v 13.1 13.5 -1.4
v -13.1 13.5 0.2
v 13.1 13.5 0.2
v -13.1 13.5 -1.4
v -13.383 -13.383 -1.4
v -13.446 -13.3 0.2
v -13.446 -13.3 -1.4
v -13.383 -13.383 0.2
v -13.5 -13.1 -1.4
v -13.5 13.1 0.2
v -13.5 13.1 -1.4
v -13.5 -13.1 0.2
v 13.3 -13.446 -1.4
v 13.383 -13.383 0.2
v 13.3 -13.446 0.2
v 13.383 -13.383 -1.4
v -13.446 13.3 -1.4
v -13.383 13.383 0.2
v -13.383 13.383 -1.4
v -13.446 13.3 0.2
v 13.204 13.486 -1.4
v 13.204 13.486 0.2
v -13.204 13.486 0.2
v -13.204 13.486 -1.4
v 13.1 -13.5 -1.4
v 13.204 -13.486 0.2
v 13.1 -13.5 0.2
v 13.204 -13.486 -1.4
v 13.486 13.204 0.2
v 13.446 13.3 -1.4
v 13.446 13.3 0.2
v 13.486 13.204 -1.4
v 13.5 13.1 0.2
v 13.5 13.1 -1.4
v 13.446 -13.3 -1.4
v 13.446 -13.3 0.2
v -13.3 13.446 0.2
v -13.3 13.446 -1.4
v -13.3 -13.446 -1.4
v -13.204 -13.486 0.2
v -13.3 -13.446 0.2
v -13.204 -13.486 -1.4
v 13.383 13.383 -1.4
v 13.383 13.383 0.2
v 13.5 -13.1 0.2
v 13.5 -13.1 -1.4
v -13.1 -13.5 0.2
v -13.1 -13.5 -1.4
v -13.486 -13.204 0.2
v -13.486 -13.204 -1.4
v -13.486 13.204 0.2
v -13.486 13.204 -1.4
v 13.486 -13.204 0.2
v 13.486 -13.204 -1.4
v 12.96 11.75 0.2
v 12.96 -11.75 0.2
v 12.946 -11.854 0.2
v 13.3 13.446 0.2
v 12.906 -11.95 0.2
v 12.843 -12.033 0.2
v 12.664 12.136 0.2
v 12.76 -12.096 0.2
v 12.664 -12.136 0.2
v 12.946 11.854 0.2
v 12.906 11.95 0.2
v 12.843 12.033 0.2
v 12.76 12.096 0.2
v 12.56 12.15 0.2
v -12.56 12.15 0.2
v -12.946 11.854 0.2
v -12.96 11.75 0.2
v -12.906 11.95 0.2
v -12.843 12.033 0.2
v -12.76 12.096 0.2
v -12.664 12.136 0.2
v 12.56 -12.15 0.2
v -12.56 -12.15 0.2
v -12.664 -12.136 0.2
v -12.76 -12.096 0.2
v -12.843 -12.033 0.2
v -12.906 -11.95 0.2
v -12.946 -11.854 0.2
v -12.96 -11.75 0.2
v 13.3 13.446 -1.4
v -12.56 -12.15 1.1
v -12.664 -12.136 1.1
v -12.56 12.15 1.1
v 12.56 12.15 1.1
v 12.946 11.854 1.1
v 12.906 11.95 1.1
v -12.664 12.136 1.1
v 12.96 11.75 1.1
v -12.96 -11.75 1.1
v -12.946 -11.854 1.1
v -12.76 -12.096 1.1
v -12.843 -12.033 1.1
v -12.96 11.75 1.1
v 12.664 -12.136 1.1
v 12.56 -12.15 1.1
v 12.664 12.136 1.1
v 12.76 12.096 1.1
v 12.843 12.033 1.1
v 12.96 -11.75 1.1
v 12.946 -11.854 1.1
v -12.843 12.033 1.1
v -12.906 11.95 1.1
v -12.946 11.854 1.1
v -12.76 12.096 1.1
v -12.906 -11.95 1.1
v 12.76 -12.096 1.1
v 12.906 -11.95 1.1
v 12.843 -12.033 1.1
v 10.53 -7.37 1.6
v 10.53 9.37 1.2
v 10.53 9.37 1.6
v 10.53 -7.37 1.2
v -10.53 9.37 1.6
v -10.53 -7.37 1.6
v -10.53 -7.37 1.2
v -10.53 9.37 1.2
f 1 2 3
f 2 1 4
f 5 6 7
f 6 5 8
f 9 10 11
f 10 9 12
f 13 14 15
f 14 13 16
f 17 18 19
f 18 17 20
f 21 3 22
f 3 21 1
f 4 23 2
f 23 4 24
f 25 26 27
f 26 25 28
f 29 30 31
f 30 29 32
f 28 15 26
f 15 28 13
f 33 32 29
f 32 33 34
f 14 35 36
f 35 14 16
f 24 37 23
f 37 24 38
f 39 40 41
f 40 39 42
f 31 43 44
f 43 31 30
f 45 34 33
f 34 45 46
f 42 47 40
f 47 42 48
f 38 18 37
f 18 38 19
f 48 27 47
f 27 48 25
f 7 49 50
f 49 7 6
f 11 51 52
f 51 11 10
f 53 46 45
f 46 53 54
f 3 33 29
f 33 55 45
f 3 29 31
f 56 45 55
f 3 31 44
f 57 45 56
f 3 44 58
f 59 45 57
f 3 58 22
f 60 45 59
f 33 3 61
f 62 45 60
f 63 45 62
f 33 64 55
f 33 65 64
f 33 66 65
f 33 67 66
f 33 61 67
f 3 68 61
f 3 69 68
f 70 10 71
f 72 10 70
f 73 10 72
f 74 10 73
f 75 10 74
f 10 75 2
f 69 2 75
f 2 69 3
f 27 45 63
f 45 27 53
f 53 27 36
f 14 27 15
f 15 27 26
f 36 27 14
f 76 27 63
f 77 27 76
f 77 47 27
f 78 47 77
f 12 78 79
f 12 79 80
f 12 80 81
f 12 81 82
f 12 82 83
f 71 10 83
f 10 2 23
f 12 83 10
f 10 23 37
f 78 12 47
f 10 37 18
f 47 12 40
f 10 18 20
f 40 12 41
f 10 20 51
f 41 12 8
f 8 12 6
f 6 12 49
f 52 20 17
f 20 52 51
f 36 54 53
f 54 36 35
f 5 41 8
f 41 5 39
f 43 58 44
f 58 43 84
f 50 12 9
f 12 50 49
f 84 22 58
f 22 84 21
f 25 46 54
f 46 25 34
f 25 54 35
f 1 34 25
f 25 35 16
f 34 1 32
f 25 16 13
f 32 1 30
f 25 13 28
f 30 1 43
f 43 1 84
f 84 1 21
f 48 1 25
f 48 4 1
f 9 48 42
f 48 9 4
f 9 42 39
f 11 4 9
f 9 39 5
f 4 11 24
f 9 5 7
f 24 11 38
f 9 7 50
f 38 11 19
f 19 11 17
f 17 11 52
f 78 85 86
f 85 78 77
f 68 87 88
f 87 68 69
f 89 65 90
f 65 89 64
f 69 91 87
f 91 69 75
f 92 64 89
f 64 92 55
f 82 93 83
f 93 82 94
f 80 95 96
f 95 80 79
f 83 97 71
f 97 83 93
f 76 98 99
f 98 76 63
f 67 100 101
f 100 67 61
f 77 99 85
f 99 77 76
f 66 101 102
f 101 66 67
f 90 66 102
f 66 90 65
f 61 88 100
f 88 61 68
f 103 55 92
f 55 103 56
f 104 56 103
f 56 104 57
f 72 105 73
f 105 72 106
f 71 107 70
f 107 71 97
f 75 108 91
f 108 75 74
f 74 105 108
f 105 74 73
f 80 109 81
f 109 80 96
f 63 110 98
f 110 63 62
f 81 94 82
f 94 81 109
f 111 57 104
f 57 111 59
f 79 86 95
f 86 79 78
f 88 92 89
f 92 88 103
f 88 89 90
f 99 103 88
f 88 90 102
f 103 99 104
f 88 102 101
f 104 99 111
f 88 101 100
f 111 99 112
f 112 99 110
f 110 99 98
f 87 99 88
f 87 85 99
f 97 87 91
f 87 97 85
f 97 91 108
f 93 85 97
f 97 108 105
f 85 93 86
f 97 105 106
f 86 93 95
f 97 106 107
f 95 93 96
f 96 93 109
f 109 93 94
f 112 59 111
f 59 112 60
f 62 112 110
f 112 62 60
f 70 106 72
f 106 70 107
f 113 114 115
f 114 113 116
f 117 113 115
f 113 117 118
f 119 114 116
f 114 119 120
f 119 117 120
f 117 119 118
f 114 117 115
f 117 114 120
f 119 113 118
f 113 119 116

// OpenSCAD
// Forge — 0.96" SSD1306 module (~27×27×4 mm)
// openscad -o oled.stl assets/scad/sat_oled.scad

w = 27;
h = 27;
d = 4;
fn = 24;

module rbox(ww, hh, dd, r = 0.4) {
  hull() {
    for (sx = [-1, 1], sy = [-1, 1]) {
      translate([sx * (ww / 2 - r), sy * (hh / 2 - r), 0])
        cylinder(h = dd, r = r, center = true, $fn = fn);
    }
  }
}

// PCB
translate([0, 0, -0.6]) rbox(w, h, 1.6);
// Bezel
rbox(w * 0.96, h * 0.9, 2.2);
// Active glass (inset)
translate([0, 1, 1.4])
  cube([w * 0.78, h * 0.62, 0.4], center = true);
